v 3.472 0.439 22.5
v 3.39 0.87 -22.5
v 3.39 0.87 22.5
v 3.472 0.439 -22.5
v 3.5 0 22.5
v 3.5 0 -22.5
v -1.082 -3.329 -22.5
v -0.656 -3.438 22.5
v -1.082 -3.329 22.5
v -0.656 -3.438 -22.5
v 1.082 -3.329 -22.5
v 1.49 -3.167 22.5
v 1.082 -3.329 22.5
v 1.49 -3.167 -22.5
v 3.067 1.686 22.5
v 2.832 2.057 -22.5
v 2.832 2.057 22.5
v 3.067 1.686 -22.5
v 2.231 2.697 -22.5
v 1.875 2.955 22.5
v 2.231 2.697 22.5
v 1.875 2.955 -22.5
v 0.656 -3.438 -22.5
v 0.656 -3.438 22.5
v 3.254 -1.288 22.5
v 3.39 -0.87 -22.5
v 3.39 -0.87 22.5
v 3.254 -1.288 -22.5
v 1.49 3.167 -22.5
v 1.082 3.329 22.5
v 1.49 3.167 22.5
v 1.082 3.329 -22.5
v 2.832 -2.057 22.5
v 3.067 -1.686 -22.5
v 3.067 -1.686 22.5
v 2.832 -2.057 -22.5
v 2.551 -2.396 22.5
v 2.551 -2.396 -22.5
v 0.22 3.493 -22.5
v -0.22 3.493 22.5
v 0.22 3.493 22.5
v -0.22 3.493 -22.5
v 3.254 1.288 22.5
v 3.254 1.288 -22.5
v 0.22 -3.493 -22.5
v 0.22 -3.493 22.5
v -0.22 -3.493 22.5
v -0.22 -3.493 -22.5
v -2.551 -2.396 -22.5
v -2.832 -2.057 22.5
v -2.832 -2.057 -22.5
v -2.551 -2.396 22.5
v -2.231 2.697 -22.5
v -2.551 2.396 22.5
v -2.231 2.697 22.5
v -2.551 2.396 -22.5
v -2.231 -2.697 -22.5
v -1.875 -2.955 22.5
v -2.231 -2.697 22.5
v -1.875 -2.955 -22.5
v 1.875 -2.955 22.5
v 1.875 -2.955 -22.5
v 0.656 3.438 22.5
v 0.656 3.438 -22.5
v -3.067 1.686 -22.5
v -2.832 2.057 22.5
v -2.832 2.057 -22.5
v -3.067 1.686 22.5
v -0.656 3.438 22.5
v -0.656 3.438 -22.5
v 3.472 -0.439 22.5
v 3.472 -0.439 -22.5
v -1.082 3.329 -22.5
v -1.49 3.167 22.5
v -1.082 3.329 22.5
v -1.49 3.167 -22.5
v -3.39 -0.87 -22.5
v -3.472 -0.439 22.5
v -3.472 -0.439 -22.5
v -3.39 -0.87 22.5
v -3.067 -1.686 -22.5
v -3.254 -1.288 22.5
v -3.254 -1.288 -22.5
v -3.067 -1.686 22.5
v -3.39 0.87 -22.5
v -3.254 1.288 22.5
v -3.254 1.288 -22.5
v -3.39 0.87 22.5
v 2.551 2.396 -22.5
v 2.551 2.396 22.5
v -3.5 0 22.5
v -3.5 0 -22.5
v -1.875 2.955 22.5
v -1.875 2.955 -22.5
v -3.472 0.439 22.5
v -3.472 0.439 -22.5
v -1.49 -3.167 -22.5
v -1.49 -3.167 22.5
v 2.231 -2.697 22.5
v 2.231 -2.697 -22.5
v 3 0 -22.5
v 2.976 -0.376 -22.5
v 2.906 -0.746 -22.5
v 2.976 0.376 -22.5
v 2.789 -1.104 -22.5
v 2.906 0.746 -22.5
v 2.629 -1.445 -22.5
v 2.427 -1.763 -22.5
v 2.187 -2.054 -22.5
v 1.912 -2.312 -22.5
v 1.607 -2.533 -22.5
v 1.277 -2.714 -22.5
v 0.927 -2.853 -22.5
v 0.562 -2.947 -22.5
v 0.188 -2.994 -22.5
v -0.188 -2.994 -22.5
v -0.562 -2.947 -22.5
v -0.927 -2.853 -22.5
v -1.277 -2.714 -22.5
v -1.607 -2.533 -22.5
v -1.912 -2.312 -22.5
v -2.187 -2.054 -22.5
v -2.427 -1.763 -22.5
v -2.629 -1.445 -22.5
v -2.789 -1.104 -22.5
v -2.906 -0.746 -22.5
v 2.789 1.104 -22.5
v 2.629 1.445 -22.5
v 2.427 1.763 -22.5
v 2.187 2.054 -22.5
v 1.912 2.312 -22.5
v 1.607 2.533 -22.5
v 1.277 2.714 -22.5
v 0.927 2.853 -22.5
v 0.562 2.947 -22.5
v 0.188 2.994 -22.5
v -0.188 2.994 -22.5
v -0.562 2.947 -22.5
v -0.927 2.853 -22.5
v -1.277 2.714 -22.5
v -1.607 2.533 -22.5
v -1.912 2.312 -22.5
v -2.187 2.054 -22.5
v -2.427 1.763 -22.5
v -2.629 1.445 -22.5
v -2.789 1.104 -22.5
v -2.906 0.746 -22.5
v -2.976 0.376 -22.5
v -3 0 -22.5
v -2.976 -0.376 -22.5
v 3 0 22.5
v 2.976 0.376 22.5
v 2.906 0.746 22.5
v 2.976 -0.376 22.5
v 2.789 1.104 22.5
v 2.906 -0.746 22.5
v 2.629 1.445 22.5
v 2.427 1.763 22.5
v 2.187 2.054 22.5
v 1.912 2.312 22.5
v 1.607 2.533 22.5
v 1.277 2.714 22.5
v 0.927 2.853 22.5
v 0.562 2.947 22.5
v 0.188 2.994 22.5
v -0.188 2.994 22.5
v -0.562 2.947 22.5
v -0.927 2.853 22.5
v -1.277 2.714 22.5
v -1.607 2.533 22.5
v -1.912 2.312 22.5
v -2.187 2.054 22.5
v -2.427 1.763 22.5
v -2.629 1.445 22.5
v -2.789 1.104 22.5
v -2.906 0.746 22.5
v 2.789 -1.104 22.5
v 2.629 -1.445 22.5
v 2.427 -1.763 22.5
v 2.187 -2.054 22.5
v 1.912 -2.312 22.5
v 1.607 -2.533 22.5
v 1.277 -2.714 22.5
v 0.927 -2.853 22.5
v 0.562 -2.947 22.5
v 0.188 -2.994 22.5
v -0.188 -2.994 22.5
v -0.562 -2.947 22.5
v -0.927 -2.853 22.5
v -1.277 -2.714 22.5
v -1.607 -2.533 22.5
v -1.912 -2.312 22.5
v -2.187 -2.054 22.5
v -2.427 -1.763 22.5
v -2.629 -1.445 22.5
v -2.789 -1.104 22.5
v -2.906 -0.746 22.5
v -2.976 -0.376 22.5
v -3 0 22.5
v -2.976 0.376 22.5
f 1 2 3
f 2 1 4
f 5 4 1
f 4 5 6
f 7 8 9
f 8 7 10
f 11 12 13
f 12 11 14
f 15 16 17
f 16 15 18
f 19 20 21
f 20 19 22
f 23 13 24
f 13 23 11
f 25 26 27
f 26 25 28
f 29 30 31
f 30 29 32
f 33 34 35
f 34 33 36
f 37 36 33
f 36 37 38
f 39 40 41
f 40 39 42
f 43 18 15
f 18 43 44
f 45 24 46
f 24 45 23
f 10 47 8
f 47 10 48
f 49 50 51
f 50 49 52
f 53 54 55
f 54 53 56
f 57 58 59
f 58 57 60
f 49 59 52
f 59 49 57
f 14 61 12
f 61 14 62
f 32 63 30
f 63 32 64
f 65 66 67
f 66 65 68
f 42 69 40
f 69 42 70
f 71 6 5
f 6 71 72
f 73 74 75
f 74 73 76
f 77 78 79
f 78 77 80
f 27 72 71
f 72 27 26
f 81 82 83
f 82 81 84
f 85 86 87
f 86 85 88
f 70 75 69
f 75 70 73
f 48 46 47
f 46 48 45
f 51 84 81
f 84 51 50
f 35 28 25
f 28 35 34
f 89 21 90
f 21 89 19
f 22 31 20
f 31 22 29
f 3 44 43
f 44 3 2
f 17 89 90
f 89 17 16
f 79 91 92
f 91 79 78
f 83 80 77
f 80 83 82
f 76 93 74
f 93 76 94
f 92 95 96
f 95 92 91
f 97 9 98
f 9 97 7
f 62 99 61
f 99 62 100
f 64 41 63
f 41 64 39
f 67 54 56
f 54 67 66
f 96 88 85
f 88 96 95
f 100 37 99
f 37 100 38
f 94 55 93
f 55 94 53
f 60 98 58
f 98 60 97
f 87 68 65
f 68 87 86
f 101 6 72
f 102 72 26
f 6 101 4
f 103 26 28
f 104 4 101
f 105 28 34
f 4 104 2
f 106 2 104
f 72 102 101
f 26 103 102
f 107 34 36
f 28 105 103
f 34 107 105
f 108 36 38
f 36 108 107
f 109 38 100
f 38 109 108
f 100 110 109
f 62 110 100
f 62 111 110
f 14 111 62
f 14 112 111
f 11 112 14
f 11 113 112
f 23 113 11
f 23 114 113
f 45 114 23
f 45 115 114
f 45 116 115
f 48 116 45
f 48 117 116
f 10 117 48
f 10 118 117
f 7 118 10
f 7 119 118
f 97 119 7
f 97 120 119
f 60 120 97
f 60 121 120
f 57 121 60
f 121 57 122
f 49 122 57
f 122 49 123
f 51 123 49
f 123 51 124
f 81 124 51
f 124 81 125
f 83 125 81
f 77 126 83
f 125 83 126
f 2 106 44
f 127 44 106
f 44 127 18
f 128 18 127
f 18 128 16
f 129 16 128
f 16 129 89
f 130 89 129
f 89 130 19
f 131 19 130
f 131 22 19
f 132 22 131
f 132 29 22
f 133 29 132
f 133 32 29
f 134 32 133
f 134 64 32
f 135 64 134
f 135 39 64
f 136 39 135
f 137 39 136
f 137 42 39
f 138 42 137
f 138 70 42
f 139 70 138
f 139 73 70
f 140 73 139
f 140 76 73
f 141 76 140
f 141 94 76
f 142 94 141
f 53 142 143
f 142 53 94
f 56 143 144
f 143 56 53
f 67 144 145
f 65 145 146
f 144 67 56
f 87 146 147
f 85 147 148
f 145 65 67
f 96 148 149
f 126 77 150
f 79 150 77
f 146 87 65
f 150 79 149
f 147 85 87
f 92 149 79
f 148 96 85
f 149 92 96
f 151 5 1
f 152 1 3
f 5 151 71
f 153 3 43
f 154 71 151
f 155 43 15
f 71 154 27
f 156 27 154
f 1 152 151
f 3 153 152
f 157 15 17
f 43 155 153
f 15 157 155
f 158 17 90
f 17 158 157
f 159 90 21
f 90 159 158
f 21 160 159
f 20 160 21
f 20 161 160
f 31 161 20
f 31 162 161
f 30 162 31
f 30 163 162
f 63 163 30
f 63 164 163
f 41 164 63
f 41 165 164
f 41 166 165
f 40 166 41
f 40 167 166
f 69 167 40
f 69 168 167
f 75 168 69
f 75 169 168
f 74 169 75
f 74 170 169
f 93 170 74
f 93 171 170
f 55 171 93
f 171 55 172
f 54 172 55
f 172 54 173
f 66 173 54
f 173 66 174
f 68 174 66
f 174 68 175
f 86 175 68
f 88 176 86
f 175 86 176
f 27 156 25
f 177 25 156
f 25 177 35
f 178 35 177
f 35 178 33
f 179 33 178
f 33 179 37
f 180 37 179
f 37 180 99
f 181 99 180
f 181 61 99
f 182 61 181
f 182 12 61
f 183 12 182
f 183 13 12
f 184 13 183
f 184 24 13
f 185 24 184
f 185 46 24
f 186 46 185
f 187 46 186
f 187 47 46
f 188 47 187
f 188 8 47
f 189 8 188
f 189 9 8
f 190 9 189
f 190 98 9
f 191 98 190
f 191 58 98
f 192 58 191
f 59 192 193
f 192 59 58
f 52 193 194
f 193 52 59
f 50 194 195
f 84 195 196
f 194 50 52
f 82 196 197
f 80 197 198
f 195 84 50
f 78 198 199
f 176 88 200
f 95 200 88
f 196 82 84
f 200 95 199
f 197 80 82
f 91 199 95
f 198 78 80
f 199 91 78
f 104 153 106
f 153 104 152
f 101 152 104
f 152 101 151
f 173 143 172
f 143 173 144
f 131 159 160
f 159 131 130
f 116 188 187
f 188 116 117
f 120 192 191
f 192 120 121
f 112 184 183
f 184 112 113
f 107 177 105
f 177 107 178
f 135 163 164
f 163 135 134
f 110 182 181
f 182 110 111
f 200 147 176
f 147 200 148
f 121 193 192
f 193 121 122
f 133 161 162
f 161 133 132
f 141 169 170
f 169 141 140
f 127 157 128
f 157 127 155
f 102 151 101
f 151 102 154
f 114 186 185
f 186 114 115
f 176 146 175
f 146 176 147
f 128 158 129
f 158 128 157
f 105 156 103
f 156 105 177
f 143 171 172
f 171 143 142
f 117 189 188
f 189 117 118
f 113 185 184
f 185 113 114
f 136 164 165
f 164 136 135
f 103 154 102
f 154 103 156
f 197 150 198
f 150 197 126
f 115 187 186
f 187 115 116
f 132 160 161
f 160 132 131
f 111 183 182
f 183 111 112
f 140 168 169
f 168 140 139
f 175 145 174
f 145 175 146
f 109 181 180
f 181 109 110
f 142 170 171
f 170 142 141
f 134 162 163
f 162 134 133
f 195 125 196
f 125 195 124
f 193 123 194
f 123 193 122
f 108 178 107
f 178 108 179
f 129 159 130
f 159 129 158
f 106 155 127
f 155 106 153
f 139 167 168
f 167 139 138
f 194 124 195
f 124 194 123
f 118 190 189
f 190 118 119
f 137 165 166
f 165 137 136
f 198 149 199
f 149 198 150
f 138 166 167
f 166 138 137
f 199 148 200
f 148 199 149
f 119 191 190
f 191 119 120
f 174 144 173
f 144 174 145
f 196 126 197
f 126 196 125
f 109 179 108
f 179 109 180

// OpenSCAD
$fn = 50;


difference() {
	union() {
		translate(v = [0, 0, -22.5000000000]) {
			cylinder(h = 45, r = 3.5000000000);
		}
	}
	union() {
		translate(v = [0, 0, -100.0000000000]) {
			cylinder(h = 200, r = 3.0000000000);
		}
	}
}
